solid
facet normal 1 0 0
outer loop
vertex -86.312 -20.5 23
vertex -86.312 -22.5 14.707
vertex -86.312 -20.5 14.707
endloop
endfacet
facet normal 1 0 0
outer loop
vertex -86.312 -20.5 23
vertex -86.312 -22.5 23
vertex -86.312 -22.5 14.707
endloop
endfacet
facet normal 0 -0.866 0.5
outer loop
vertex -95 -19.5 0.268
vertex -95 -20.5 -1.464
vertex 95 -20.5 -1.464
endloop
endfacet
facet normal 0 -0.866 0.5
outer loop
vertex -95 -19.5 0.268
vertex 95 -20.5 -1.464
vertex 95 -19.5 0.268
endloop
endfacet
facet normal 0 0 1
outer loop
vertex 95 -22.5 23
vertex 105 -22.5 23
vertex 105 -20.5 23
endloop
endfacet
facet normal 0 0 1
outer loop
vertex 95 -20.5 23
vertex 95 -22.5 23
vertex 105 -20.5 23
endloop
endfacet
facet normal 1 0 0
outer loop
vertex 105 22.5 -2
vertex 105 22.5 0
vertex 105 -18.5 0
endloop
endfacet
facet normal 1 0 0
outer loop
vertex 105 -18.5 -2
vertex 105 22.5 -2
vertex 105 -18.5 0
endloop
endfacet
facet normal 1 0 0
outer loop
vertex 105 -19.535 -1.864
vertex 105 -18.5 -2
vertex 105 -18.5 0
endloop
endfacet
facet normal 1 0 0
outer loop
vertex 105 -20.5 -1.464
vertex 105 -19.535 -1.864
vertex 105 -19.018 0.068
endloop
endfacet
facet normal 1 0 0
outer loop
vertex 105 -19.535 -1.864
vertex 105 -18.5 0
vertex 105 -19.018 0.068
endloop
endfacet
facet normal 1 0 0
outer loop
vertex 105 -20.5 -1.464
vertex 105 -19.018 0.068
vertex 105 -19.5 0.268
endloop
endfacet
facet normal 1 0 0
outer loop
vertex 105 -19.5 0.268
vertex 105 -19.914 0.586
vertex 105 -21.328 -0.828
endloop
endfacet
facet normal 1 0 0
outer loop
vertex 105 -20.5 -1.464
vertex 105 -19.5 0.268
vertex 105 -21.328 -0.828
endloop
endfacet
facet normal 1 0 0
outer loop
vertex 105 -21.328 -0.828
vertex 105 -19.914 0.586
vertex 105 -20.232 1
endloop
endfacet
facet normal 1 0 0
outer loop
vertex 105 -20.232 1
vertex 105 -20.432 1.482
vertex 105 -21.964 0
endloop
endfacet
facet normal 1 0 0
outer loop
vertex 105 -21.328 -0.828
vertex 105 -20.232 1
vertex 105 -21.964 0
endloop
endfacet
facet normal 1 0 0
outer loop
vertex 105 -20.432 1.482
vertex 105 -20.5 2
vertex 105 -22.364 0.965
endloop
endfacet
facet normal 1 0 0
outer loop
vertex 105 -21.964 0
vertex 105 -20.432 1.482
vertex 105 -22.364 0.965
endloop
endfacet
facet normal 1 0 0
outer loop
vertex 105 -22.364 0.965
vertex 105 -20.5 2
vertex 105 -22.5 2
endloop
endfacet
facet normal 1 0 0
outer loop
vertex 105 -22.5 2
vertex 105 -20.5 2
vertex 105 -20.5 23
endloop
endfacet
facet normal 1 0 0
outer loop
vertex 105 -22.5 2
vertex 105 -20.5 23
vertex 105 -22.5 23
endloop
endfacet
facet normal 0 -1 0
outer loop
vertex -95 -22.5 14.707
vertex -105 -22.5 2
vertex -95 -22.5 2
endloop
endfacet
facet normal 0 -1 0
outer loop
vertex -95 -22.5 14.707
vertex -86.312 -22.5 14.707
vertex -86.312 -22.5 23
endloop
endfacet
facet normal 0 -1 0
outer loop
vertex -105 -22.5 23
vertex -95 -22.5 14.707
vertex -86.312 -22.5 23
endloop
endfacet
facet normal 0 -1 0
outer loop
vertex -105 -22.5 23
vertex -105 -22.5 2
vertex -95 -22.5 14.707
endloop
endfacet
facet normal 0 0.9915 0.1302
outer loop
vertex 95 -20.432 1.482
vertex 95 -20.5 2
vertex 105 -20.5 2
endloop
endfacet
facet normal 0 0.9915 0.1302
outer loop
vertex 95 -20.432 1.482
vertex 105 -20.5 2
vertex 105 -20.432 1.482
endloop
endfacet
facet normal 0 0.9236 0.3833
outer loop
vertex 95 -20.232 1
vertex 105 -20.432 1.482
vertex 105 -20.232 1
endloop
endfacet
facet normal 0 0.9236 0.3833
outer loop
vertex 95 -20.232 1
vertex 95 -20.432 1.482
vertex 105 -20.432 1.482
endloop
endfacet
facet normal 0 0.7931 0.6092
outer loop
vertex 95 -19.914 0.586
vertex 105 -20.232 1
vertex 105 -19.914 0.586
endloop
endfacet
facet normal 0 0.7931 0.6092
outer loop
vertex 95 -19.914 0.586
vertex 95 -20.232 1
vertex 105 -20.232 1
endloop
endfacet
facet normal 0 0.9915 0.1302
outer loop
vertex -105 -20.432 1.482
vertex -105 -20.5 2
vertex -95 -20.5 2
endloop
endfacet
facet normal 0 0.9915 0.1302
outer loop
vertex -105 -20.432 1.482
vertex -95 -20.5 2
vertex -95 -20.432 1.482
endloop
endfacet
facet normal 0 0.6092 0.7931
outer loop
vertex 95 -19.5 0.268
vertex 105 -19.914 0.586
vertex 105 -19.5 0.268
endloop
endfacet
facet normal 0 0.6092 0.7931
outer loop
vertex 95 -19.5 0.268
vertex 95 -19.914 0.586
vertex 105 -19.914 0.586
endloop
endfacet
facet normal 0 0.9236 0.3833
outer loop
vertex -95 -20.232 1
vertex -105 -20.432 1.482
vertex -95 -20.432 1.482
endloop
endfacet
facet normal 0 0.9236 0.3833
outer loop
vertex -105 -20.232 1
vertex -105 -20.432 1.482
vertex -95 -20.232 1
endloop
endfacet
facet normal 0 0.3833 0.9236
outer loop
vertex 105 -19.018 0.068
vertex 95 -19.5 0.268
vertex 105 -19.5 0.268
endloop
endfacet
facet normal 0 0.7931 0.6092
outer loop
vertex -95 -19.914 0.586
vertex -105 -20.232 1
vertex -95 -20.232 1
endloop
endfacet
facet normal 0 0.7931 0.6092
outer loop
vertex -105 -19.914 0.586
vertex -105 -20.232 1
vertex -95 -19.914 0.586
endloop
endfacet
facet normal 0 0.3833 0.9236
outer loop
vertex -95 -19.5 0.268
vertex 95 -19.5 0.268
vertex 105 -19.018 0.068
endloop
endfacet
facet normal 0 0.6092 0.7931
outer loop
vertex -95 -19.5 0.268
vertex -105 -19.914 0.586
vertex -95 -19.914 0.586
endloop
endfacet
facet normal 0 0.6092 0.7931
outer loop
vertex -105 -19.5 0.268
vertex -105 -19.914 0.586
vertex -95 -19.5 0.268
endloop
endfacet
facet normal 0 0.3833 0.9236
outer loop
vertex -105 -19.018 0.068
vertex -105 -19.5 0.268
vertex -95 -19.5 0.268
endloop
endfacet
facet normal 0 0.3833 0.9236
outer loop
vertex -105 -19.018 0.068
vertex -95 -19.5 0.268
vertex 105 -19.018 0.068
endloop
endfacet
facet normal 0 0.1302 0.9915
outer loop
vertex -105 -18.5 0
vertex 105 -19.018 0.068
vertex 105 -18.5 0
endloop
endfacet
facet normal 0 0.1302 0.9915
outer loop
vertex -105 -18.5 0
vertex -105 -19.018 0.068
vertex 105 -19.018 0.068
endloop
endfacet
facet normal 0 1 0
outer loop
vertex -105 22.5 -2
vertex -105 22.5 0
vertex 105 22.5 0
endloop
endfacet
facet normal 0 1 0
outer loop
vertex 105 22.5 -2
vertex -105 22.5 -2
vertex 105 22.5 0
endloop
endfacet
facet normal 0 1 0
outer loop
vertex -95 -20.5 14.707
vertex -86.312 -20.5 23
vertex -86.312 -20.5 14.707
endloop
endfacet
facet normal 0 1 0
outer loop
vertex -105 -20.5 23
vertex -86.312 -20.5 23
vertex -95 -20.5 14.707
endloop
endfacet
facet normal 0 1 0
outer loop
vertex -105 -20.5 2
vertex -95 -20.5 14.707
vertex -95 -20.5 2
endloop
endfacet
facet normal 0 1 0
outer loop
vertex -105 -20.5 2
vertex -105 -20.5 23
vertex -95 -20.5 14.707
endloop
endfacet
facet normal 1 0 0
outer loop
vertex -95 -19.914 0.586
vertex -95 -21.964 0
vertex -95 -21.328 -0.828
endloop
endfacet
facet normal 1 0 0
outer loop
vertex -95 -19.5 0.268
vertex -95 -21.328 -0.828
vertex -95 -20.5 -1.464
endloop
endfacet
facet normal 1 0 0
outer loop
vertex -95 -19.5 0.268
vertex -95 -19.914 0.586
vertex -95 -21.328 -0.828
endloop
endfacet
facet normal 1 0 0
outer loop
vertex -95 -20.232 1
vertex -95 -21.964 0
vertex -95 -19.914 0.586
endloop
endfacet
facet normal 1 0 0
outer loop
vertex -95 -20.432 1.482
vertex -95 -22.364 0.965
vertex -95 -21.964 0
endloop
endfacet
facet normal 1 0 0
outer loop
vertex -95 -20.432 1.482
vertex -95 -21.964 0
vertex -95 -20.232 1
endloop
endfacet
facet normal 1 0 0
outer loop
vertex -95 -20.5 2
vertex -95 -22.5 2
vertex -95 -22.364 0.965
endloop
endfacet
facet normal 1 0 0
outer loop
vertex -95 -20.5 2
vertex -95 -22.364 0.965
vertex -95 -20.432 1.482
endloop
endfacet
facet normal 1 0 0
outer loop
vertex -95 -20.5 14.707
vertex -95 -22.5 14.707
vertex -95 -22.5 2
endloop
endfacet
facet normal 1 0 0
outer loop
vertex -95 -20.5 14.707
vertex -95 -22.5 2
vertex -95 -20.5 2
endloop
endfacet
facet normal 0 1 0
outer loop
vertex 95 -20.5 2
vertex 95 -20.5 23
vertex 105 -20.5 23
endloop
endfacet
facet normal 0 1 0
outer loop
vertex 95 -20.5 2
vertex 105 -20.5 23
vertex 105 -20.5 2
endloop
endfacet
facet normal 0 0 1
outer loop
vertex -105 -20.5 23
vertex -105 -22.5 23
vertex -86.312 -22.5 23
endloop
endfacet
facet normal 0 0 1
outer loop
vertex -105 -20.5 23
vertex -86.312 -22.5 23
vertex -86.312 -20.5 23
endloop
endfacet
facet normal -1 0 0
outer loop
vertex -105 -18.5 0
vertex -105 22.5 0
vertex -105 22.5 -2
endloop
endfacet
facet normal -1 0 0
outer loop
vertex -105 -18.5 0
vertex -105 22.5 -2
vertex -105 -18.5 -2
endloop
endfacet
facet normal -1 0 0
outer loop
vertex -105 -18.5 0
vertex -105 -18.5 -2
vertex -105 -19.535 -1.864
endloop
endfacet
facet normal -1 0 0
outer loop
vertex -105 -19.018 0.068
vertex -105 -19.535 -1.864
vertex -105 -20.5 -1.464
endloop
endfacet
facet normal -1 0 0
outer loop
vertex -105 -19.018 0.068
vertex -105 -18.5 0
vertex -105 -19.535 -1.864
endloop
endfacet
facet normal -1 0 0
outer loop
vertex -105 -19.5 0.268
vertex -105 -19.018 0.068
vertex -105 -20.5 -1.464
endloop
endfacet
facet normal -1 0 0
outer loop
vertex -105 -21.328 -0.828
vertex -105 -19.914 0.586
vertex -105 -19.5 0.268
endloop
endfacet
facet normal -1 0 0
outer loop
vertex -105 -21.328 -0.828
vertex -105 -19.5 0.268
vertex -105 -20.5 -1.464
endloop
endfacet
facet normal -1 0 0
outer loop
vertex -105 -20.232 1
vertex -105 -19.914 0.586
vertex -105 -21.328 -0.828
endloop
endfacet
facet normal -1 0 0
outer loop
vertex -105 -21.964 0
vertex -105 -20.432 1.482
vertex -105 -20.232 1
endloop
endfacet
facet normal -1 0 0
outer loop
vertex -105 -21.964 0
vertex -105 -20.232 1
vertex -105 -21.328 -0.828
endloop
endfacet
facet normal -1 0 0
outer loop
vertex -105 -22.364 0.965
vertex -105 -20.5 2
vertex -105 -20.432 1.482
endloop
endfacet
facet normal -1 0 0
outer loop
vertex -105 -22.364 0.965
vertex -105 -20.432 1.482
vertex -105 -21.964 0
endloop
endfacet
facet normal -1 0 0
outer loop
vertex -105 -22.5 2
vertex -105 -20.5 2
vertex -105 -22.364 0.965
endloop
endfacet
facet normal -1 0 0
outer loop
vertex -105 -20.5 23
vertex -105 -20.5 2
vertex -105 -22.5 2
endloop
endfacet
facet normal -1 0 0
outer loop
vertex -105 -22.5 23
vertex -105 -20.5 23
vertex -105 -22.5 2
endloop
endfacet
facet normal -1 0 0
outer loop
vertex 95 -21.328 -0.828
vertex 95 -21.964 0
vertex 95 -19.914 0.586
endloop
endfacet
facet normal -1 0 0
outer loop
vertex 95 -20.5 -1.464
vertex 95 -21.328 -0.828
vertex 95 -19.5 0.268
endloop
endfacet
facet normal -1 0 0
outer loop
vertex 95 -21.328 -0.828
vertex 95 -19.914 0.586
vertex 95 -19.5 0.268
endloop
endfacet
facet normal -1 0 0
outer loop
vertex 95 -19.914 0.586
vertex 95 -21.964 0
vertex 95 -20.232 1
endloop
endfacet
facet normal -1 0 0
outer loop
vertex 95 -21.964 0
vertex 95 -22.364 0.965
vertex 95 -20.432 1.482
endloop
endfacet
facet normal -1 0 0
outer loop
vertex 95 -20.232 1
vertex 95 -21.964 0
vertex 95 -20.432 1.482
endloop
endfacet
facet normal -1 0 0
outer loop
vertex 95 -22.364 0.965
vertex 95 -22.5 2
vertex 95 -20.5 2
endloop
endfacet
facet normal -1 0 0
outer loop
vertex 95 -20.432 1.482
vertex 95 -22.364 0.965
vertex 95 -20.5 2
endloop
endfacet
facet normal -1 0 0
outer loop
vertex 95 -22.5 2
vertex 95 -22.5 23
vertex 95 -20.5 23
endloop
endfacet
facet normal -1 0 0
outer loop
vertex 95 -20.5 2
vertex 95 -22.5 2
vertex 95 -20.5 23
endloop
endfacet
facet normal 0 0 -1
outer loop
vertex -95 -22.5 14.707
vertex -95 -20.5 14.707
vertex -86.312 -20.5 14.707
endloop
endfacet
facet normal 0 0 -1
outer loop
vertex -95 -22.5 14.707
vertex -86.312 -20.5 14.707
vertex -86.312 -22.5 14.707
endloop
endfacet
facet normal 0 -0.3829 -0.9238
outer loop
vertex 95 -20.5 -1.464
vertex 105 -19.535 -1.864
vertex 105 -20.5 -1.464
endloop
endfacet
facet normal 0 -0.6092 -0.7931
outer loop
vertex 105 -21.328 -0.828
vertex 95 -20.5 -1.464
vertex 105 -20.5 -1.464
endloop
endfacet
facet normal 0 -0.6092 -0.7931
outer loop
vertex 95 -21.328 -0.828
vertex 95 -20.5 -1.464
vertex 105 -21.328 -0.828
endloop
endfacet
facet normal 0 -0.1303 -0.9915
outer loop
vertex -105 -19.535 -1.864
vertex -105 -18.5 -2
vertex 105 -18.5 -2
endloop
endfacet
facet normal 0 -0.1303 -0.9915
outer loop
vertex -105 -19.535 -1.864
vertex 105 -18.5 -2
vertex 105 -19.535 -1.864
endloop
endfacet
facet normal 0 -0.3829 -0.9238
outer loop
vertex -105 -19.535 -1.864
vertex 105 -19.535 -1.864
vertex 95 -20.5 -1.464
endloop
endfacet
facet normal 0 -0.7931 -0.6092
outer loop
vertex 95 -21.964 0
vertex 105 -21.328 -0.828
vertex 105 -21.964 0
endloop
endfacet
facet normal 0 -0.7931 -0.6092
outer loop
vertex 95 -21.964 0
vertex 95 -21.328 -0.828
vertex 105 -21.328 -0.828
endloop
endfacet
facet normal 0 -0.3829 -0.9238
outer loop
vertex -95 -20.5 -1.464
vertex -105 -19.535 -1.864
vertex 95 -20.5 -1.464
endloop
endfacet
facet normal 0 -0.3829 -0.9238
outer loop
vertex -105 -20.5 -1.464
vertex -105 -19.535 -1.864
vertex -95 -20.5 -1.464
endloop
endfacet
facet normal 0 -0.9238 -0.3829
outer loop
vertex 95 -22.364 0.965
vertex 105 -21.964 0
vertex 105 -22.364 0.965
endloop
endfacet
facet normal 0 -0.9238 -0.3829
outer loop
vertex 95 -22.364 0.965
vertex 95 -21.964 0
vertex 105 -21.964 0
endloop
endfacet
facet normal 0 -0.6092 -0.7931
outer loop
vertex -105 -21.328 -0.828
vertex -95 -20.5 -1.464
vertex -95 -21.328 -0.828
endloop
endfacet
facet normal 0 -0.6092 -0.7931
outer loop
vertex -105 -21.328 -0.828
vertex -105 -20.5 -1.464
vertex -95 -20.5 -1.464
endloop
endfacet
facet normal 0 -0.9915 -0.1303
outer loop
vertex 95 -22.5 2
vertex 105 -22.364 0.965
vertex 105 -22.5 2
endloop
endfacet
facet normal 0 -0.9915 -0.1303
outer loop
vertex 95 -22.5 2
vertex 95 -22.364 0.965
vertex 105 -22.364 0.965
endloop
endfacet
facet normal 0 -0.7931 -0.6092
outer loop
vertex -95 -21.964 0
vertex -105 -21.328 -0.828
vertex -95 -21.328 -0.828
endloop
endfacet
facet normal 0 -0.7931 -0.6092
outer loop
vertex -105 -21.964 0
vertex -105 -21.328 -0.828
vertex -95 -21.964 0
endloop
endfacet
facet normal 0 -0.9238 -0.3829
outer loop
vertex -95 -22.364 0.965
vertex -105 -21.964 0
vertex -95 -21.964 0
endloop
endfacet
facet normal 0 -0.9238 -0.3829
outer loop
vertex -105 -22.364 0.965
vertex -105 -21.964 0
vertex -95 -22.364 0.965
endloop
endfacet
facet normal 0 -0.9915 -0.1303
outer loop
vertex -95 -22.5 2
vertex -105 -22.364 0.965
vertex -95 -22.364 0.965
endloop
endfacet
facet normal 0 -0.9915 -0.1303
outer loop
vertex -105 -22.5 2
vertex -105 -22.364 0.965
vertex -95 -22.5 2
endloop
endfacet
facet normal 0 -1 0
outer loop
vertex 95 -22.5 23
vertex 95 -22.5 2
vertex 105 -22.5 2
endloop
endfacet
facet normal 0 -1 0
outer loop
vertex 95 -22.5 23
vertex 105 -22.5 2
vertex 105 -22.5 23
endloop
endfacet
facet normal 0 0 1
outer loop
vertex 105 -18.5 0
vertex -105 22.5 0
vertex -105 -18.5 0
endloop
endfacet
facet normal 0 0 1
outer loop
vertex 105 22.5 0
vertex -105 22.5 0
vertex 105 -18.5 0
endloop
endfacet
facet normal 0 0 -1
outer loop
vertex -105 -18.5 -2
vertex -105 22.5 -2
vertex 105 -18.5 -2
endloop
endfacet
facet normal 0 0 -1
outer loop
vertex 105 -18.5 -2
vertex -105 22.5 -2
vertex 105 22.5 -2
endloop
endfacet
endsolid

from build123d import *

# Parameters (mm, degrees)
SKETCH1_W                        = 210
SKETCH1_H                        = 45
BASE_FLANGE1_DEPTH               = 2
SM_EDGE_FLANGE_1_STRIP_W         = 12
SM_EDGE_FLANGE_1_STRIP_H         = 2
SM_EDGE_FLANGE_1_STRIP_CUT_DEPTH = 210
SM_EDGE_FLANGE_1_DEPTH           = 210
CUT_EXTRUDE1_START               = -86.312353883
CUT_EXTRUDE1_DEPTH               = 181.312353883
CUT_EXTRUDE1_START_2             = -95
CUT_EXTRUDE1_2_DEPTH             = 8.687646117


# Read off the part's stored shape, not the designer's step: Cut-Extrude1
# Sheet-metal steps are written as plain solids
with BuildPart() as part:
    # Sketch1 → Base-Flange1 (new body)
    with BuildSketch(Plane.XY):
        Rectangle(SKETCH1_W, SKETCH1_H)
    extrude(amount=-BASE_FLANGE1_DEPTH)

    # Ребро-кромка1 strip (across the edge) → Ребро-кромка1 strip cut (cut)
    with BuildSketch(Plane(origin=(-105, -22.5, 0), x_dir=(0, 1, 0), z_dir=(1, 0, 0))):
        with Locations((-2, -1)):
            Rectangle(SM_EDGE_FLANGE_1_STRIP_W, SM_EDGE_FLANGE_1_STRIP_H)
    extrude(amount=SM_EDGE_FLANGE_1_STRIP_CUT_DEPTH, mode=Mode.SUBTRACT)

    # Ребро-кромка1 section (across the edge) → Ребро-кромка1 (add)
    with BuildSketch(Plane(origin=(-105, -22.5, 0), x_dir=(0, 1, 0), z_dir=(1, 0, 0))):
        with BuildLine():
            Line((0, 2), (0, 23))
            Line((0, 23), (2, 23))
            Line((2, 23), (2, 2))
            ThreePointArc((2, 2), (2.585786438, 0.585786438), (4, 0))
            Line((4, 0), (4, -2))
            ThreePointArc((4, -2), (1.171572875, -0.828427125), (0, 2))
        make_face()
    extrude(amount=SM_EDGE_FLANGE_1_DEPTH)

    # Cut-Extrude1 outline → Cut-Extrude1 (cut)
    with BuildSketch(Plane.YZ.offset(CUT_EXTRUDE1_START)):
        with BuildLine():
            Line((-20.5, 2), (-20.5, 23))
            Line((-20.5, 23), (-22.5, 23))
            Line((-22.5, 23), (-22.5, 2))
            ThreePointArc((-22.5, 2), (-21.964101615, 0), (-20.5, -1.464101615))
            Line((-20.5, -1.464101615), (-19.5, 0.267949193))
            ThreePointArc((-19.5, 0.267949193), (-20.232050807, 1), (-20.5, 2))
        make_face()
    extrude(amount=CUT_EXTRUDE1_DEPTH, mode=Mode.SUBTRACT)

    # Cut-Extrude1 2 outline → Cut-Extrude1 2 (cut)
    with BuildSketch(Plane.YZ.offset(CUT_EXTRUDE1_START_2)):
        with BuildLine():
            Line((-20.5, 2), (-20.5, 14.70719641))
            Line((-20.5, 14.70719641), (-22.5, 14.70719641))
            Line((-22.5, 14.70719641), (-22.5, 2))
            ThreePointArc((-22.5, 2), (-21.964101615, 0), (-20.5, -1.464101615))
            Line((-20.5, -1.464101615), (-19.5, 0.267949193))
            ThreePointArc((-19.5, 0.267949193), (-20.232050807, 1), (-20.5, 2))
        make_face()
    extrude(amount=CUT_EXTRUDE1_2_DEPTH, mode=Mode.SUBTRACT)


solid = part.part
